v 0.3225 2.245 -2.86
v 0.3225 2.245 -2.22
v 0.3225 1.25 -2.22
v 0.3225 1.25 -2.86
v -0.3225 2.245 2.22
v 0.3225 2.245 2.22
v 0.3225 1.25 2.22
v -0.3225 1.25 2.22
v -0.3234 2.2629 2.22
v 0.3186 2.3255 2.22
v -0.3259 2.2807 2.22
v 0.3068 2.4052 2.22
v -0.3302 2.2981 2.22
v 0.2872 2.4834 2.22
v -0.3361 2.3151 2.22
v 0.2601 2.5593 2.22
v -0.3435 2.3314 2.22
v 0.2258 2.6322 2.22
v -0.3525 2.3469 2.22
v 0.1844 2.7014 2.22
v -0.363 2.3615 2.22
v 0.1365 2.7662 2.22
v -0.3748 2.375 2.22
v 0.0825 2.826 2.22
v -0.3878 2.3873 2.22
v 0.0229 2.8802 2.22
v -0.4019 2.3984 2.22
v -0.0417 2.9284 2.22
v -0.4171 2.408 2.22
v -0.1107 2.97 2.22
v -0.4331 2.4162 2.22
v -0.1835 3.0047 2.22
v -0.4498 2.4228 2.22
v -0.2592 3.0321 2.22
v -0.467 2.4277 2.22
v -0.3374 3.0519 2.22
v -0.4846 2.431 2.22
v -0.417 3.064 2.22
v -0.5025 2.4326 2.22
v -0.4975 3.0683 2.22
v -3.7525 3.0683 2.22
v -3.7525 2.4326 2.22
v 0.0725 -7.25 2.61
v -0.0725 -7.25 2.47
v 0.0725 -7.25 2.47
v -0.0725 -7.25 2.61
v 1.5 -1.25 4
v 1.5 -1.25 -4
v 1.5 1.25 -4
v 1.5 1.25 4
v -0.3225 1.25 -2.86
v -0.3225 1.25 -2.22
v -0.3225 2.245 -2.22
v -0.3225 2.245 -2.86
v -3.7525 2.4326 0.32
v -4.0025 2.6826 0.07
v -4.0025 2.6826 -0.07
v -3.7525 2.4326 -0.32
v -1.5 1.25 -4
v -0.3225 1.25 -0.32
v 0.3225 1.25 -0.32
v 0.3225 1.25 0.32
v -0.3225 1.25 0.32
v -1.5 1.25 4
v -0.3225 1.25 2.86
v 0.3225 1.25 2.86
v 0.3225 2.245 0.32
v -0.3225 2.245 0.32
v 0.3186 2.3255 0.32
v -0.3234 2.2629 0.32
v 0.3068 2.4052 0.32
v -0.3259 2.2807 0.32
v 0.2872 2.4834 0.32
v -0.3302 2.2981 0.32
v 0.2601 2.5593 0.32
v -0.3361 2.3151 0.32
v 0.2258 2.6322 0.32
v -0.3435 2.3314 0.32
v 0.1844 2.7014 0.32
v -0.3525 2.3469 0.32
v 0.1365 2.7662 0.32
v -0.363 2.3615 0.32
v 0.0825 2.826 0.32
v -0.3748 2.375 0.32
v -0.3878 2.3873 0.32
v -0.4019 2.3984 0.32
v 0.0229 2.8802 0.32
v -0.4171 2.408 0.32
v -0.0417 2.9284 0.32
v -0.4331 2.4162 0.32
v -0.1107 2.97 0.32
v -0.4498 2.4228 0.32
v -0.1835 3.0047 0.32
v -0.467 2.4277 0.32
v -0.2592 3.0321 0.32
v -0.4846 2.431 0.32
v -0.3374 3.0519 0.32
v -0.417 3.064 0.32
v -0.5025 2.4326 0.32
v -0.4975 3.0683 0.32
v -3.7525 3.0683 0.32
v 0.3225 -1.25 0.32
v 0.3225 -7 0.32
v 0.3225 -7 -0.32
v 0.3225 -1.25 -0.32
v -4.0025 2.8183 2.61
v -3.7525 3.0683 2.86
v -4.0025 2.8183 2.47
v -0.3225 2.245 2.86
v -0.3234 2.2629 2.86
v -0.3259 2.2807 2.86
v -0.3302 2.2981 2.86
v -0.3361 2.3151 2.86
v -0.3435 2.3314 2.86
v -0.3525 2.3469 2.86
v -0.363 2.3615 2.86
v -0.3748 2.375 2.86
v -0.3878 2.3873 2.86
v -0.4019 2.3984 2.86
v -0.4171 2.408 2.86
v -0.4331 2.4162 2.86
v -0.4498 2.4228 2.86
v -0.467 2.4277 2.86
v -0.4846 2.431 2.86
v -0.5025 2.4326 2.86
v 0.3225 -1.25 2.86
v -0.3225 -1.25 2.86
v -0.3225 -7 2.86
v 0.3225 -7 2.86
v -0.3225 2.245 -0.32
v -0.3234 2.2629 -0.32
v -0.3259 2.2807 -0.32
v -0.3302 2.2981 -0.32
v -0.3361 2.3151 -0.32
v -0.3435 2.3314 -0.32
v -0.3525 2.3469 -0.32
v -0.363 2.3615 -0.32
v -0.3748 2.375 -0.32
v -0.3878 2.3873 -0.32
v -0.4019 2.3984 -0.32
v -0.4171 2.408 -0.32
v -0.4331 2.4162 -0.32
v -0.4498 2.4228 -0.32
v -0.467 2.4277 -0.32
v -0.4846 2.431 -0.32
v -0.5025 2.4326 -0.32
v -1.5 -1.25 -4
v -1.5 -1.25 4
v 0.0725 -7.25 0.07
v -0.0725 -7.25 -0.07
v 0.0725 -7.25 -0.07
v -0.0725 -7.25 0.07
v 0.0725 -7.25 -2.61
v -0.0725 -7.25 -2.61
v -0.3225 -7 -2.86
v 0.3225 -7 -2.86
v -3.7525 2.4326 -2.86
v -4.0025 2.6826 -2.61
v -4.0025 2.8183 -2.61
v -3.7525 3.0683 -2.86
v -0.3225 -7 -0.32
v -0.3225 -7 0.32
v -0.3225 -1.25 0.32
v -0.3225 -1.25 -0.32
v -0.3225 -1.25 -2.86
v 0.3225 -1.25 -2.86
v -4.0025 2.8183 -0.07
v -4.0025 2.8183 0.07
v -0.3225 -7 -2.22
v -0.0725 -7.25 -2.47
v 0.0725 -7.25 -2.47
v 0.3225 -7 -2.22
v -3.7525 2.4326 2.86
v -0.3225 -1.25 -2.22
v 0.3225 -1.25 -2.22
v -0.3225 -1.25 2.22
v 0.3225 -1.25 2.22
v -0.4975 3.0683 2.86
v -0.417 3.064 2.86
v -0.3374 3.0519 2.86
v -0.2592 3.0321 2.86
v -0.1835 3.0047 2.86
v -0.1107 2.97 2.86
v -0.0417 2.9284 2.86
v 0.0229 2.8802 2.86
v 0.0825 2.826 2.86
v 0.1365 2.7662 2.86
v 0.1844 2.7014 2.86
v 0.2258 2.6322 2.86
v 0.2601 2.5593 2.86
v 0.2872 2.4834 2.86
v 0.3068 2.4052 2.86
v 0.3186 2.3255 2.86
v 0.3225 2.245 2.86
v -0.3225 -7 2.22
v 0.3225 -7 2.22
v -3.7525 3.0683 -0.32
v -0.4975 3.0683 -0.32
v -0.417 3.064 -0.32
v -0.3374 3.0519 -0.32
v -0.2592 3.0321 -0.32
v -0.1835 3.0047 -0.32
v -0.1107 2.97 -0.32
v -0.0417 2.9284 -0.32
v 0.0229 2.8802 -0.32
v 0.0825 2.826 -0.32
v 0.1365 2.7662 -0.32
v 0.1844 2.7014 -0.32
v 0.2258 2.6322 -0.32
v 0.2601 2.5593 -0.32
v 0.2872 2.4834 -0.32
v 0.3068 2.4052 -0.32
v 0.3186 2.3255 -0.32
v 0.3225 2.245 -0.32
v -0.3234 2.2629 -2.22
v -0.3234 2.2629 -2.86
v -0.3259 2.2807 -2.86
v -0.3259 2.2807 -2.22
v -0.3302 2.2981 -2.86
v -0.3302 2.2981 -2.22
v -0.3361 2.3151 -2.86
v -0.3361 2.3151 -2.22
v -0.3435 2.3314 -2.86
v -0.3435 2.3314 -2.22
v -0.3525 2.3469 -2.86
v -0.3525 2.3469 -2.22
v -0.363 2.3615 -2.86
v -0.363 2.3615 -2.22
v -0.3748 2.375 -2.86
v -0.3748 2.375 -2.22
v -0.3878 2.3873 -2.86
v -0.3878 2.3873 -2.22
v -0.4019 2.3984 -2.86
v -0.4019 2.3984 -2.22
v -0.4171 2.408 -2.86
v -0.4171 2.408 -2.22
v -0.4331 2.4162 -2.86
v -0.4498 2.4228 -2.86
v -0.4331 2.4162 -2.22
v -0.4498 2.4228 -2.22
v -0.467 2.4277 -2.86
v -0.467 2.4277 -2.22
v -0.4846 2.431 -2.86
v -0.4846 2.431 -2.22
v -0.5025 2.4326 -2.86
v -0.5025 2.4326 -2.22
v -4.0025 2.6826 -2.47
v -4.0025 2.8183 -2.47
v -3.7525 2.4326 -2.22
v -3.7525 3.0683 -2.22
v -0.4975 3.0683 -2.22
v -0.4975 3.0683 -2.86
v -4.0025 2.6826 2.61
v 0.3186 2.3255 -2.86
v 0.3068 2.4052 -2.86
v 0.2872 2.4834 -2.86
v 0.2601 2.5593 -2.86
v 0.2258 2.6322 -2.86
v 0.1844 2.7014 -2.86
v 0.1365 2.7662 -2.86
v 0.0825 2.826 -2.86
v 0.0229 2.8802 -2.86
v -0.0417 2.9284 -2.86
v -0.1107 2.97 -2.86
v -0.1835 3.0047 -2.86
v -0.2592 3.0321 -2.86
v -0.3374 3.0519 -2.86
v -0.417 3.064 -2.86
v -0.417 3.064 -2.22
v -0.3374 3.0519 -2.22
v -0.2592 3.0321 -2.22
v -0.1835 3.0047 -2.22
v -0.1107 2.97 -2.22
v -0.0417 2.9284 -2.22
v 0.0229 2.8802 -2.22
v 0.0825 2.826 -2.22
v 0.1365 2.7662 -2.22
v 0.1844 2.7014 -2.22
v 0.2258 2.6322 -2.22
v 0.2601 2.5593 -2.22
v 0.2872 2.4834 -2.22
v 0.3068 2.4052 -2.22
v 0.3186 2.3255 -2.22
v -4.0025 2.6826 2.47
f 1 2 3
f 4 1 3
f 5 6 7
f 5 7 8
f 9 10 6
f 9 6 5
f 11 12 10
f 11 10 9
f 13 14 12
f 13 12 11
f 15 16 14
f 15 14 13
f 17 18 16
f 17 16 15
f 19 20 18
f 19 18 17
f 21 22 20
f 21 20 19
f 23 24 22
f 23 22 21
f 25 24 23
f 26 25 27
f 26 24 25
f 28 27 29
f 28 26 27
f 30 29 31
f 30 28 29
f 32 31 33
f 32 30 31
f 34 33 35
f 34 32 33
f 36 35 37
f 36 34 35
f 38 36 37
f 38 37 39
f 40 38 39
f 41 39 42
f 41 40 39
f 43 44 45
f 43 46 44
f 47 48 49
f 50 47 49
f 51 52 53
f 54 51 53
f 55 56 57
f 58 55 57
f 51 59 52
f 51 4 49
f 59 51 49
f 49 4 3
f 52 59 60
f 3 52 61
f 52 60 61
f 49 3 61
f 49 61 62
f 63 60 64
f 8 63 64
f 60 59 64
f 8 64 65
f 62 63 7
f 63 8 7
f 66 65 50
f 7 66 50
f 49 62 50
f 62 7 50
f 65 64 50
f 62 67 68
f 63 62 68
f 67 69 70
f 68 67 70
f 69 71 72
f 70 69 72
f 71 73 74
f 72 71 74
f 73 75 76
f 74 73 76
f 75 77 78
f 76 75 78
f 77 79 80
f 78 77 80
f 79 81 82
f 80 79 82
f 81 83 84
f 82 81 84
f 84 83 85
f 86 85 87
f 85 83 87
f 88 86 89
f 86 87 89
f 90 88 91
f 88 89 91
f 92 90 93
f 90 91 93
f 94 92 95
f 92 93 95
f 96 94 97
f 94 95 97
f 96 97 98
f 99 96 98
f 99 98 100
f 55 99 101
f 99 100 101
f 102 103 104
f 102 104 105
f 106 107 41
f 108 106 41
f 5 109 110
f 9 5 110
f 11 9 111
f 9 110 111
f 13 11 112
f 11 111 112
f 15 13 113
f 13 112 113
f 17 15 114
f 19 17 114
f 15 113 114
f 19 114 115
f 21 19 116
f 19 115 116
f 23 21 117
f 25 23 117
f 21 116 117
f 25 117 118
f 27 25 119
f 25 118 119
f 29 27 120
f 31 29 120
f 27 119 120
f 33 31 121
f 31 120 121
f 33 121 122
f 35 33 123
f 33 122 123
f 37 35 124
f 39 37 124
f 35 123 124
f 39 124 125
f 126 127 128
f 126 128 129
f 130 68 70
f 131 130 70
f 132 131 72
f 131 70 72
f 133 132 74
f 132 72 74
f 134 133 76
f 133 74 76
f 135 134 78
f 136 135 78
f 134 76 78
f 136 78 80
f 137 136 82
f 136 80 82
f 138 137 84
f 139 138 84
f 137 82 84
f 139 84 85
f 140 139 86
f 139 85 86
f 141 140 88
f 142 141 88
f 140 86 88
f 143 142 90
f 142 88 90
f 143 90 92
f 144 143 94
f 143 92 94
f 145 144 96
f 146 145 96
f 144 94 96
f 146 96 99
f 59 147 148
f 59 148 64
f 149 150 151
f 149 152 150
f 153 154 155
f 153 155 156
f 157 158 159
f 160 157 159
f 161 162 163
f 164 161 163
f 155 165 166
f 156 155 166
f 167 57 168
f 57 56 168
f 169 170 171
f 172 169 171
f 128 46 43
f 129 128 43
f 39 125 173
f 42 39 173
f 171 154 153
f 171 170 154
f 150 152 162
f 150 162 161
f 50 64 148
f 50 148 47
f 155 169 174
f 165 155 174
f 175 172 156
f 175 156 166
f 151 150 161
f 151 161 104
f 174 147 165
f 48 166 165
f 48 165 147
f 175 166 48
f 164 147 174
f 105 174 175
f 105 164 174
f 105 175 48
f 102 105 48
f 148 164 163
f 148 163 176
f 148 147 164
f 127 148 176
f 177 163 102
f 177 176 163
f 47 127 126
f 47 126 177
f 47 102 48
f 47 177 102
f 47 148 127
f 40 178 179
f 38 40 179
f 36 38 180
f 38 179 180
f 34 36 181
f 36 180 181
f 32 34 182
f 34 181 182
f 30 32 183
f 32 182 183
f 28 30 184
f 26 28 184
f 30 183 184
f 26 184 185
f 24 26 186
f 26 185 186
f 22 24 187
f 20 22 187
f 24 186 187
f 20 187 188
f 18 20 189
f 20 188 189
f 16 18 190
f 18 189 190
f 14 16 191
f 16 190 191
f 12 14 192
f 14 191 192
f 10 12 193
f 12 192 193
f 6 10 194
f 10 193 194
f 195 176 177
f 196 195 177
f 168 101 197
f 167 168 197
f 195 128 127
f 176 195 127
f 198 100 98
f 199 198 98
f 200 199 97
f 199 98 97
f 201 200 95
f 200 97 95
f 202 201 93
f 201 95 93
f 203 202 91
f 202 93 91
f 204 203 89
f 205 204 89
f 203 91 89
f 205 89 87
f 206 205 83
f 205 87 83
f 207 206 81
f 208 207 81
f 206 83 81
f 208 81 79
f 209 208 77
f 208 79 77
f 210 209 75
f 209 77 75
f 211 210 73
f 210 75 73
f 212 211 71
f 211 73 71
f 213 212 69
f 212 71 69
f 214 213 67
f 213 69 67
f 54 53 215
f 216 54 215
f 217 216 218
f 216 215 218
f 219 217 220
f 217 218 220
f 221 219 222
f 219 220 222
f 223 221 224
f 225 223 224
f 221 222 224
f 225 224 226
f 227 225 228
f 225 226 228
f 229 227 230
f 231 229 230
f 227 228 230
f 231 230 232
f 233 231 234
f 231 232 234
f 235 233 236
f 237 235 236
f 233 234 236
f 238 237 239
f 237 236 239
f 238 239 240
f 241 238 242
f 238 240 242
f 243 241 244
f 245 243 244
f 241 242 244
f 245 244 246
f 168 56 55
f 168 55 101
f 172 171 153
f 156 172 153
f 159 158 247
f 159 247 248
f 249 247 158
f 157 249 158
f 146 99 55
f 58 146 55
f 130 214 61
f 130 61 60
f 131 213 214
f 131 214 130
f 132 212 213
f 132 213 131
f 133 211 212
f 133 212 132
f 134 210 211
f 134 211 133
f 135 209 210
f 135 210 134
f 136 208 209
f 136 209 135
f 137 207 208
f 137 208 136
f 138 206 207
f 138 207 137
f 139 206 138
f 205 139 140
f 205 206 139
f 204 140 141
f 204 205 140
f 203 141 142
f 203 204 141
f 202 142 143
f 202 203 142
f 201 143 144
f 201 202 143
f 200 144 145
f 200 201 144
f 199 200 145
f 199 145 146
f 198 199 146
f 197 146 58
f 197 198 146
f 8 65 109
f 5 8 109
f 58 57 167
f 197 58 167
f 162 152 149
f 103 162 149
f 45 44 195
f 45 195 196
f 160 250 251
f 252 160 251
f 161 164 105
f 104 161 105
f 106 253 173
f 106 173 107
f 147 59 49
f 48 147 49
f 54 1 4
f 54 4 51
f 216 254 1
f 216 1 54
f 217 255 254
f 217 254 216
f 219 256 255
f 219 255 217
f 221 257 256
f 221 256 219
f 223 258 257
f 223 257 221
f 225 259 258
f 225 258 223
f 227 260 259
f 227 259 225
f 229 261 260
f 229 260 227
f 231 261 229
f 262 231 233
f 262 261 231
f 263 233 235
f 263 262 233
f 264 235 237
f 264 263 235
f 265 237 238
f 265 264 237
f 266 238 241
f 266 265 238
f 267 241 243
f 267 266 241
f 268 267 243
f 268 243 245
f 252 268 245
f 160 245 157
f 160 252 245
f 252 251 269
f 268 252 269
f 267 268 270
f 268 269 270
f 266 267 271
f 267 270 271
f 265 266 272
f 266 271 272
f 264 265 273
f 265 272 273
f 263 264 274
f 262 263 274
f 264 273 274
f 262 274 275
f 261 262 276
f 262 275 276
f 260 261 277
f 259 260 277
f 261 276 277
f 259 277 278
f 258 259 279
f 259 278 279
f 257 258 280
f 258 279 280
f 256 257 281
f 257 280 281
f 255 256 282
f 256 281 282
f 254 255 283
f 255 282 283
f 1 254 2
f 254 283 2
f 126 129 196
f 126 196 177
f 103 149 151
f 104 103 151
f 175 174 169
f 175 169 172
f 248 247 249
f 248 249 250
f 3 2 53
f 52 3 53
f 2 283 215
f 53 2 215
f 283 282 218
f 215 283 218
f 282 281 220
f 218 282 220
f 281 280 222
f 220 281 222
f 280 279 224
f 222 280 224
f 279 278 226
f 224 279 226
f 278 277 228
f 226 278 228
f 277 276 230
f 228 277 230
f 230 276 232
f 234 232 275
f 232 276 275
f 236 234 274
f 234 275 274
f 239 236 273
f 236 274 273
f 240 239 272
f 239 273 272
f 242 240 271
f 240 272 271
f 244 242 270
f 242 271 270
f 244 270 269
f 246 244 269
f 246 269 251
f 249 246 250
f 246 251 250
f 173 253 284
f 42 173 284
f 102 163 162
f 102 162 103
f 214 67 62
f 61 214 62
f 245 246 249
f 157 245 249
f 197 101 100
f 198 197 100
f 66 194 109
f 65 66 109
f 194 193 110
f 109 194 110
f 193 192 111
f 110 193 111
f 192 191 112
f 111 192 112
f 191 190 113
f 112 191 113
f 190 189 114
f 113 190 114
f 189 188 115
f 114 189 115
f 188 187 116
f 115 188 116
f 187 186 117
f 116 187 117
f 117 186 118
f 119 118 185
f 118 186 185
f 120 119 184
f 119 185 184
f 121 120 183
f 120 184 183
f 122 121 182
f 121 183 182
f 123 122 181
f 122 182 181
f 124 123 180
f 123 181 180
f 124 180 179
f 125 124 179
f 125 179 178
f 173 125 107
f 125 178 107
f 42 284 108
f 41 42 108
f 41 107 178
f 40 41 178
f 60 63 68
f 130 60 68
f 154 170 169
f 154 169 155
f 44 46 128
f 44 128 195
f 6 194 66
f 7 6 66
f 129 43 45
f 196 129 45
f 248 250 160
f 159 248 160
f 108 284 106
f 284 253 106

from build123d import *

# Parameters (mm, degrees)
SKETCH1_W       = 3
SKETCH1_H       = 2.5
EXTRUDE1_DEPTH  = 4
SKETCH2_W       = 0.645
SKETCH2_H       = 6
EXTRUDE2_DEPTH  = 0.64
LPATTERN1_COUNT = 3
LPATTERN1_PITCH = 2.54
CHAMFER1_SIZE   = 0.25


with BuildPart() as part:
    # Sketch1 → Extrude1 (new body, symmetric)
    with BuildSketch(Plane.XY):
        Rectangle(SKETCH1_W, SKETCH1_H)
    extrude(amount=EXTRUDE1_DEPTH, both=True)

    # Sketch2 → Extrude2 (add)
    with BuildSketch(Plane.XY.offset(2.86)):
        with BuildLine():
            Line((-0.3225, 1.25), (-0.3225, 2.245))
            ThreePointArc((-0.3225, 2.245), (-0.374776878, 2.375), (-0.5025, 2.43261663))
            Line((-0.5025, 2.43261663), (-4.0025, 2.43261663))
            Line((-4.0025, 2.43261663), (-4.0025, 3.06831282))
            Line((-4.0025, 3.06831282), (-0.4975, 3.06831282))
            ThreePointArc((-0.4975, 3.06831282), (0.082527742, 2.826), (0.3225, 2.245))
            Line((0.3225, 2.245), (0.3225, 1.25))
            Line((0.3225, 1.25), (-0.3225, 1.25))
        make_face()
        with Locations((0, -4.25)):
            Rectangle(SKETCH2_W, SKETCH2_H)
    extrude2 = extrude(amount=-EXTRUDE2_DEPTH)

    # LPattern1: Extrude2 ×3
    with Locations(*[(0, 0, -i * LPATTERN1_PITCH) for i in range(1, LPATTERN1_COUNT)]):
        add(extrude2)

    # Chamfer1
    chamfer1_edges = [part.edges().sort_by_distance(p)[0] for p in [
        (-4.0025, 2.750464725, 2.22),
        (-4.0025, 2.43261663, 2.54),
        (-4.0025, 3.06831282, 2.54),
        (-4.0025, 2.750464725, 2.86),
        (0, -7.25, 2.22),
        (0.3225, -7.25, 2.54),
        (-0.3225, -7.25, 2.54),
        (0, -7.25, 2.86),
        (-4.0025, 2.750464725, -0.32),
        (-4.0025, 2.43261663, 0),
        (-4.0025, 3.06831282, 0),
        (-4.0025, 2.750464725, 0.32),
        (0, -7.25, -0.32),
        (0.3225, -7.25, 0),
        (-0.3225, -7.25, 0),
        (0, -7.25, 0.32),
        (-4.0025, 2.750464725, -2.86),
        (-4.0025, 2.43261663, -2.54),
        (-4.0025, 3.06831282, -2.54),
        (-4.0025, 2.750464725, -2.22),
        (0, -7.25, -2.86),
        (0.3225, -7.25, -2.54),
        (-0.3225, -7.25, -2.54),
        (0, -7.25, -2.22),
    ]]
    chamfer(chamfer1_edges, length=CHAMFER1_SIZE)


solid = part.part
